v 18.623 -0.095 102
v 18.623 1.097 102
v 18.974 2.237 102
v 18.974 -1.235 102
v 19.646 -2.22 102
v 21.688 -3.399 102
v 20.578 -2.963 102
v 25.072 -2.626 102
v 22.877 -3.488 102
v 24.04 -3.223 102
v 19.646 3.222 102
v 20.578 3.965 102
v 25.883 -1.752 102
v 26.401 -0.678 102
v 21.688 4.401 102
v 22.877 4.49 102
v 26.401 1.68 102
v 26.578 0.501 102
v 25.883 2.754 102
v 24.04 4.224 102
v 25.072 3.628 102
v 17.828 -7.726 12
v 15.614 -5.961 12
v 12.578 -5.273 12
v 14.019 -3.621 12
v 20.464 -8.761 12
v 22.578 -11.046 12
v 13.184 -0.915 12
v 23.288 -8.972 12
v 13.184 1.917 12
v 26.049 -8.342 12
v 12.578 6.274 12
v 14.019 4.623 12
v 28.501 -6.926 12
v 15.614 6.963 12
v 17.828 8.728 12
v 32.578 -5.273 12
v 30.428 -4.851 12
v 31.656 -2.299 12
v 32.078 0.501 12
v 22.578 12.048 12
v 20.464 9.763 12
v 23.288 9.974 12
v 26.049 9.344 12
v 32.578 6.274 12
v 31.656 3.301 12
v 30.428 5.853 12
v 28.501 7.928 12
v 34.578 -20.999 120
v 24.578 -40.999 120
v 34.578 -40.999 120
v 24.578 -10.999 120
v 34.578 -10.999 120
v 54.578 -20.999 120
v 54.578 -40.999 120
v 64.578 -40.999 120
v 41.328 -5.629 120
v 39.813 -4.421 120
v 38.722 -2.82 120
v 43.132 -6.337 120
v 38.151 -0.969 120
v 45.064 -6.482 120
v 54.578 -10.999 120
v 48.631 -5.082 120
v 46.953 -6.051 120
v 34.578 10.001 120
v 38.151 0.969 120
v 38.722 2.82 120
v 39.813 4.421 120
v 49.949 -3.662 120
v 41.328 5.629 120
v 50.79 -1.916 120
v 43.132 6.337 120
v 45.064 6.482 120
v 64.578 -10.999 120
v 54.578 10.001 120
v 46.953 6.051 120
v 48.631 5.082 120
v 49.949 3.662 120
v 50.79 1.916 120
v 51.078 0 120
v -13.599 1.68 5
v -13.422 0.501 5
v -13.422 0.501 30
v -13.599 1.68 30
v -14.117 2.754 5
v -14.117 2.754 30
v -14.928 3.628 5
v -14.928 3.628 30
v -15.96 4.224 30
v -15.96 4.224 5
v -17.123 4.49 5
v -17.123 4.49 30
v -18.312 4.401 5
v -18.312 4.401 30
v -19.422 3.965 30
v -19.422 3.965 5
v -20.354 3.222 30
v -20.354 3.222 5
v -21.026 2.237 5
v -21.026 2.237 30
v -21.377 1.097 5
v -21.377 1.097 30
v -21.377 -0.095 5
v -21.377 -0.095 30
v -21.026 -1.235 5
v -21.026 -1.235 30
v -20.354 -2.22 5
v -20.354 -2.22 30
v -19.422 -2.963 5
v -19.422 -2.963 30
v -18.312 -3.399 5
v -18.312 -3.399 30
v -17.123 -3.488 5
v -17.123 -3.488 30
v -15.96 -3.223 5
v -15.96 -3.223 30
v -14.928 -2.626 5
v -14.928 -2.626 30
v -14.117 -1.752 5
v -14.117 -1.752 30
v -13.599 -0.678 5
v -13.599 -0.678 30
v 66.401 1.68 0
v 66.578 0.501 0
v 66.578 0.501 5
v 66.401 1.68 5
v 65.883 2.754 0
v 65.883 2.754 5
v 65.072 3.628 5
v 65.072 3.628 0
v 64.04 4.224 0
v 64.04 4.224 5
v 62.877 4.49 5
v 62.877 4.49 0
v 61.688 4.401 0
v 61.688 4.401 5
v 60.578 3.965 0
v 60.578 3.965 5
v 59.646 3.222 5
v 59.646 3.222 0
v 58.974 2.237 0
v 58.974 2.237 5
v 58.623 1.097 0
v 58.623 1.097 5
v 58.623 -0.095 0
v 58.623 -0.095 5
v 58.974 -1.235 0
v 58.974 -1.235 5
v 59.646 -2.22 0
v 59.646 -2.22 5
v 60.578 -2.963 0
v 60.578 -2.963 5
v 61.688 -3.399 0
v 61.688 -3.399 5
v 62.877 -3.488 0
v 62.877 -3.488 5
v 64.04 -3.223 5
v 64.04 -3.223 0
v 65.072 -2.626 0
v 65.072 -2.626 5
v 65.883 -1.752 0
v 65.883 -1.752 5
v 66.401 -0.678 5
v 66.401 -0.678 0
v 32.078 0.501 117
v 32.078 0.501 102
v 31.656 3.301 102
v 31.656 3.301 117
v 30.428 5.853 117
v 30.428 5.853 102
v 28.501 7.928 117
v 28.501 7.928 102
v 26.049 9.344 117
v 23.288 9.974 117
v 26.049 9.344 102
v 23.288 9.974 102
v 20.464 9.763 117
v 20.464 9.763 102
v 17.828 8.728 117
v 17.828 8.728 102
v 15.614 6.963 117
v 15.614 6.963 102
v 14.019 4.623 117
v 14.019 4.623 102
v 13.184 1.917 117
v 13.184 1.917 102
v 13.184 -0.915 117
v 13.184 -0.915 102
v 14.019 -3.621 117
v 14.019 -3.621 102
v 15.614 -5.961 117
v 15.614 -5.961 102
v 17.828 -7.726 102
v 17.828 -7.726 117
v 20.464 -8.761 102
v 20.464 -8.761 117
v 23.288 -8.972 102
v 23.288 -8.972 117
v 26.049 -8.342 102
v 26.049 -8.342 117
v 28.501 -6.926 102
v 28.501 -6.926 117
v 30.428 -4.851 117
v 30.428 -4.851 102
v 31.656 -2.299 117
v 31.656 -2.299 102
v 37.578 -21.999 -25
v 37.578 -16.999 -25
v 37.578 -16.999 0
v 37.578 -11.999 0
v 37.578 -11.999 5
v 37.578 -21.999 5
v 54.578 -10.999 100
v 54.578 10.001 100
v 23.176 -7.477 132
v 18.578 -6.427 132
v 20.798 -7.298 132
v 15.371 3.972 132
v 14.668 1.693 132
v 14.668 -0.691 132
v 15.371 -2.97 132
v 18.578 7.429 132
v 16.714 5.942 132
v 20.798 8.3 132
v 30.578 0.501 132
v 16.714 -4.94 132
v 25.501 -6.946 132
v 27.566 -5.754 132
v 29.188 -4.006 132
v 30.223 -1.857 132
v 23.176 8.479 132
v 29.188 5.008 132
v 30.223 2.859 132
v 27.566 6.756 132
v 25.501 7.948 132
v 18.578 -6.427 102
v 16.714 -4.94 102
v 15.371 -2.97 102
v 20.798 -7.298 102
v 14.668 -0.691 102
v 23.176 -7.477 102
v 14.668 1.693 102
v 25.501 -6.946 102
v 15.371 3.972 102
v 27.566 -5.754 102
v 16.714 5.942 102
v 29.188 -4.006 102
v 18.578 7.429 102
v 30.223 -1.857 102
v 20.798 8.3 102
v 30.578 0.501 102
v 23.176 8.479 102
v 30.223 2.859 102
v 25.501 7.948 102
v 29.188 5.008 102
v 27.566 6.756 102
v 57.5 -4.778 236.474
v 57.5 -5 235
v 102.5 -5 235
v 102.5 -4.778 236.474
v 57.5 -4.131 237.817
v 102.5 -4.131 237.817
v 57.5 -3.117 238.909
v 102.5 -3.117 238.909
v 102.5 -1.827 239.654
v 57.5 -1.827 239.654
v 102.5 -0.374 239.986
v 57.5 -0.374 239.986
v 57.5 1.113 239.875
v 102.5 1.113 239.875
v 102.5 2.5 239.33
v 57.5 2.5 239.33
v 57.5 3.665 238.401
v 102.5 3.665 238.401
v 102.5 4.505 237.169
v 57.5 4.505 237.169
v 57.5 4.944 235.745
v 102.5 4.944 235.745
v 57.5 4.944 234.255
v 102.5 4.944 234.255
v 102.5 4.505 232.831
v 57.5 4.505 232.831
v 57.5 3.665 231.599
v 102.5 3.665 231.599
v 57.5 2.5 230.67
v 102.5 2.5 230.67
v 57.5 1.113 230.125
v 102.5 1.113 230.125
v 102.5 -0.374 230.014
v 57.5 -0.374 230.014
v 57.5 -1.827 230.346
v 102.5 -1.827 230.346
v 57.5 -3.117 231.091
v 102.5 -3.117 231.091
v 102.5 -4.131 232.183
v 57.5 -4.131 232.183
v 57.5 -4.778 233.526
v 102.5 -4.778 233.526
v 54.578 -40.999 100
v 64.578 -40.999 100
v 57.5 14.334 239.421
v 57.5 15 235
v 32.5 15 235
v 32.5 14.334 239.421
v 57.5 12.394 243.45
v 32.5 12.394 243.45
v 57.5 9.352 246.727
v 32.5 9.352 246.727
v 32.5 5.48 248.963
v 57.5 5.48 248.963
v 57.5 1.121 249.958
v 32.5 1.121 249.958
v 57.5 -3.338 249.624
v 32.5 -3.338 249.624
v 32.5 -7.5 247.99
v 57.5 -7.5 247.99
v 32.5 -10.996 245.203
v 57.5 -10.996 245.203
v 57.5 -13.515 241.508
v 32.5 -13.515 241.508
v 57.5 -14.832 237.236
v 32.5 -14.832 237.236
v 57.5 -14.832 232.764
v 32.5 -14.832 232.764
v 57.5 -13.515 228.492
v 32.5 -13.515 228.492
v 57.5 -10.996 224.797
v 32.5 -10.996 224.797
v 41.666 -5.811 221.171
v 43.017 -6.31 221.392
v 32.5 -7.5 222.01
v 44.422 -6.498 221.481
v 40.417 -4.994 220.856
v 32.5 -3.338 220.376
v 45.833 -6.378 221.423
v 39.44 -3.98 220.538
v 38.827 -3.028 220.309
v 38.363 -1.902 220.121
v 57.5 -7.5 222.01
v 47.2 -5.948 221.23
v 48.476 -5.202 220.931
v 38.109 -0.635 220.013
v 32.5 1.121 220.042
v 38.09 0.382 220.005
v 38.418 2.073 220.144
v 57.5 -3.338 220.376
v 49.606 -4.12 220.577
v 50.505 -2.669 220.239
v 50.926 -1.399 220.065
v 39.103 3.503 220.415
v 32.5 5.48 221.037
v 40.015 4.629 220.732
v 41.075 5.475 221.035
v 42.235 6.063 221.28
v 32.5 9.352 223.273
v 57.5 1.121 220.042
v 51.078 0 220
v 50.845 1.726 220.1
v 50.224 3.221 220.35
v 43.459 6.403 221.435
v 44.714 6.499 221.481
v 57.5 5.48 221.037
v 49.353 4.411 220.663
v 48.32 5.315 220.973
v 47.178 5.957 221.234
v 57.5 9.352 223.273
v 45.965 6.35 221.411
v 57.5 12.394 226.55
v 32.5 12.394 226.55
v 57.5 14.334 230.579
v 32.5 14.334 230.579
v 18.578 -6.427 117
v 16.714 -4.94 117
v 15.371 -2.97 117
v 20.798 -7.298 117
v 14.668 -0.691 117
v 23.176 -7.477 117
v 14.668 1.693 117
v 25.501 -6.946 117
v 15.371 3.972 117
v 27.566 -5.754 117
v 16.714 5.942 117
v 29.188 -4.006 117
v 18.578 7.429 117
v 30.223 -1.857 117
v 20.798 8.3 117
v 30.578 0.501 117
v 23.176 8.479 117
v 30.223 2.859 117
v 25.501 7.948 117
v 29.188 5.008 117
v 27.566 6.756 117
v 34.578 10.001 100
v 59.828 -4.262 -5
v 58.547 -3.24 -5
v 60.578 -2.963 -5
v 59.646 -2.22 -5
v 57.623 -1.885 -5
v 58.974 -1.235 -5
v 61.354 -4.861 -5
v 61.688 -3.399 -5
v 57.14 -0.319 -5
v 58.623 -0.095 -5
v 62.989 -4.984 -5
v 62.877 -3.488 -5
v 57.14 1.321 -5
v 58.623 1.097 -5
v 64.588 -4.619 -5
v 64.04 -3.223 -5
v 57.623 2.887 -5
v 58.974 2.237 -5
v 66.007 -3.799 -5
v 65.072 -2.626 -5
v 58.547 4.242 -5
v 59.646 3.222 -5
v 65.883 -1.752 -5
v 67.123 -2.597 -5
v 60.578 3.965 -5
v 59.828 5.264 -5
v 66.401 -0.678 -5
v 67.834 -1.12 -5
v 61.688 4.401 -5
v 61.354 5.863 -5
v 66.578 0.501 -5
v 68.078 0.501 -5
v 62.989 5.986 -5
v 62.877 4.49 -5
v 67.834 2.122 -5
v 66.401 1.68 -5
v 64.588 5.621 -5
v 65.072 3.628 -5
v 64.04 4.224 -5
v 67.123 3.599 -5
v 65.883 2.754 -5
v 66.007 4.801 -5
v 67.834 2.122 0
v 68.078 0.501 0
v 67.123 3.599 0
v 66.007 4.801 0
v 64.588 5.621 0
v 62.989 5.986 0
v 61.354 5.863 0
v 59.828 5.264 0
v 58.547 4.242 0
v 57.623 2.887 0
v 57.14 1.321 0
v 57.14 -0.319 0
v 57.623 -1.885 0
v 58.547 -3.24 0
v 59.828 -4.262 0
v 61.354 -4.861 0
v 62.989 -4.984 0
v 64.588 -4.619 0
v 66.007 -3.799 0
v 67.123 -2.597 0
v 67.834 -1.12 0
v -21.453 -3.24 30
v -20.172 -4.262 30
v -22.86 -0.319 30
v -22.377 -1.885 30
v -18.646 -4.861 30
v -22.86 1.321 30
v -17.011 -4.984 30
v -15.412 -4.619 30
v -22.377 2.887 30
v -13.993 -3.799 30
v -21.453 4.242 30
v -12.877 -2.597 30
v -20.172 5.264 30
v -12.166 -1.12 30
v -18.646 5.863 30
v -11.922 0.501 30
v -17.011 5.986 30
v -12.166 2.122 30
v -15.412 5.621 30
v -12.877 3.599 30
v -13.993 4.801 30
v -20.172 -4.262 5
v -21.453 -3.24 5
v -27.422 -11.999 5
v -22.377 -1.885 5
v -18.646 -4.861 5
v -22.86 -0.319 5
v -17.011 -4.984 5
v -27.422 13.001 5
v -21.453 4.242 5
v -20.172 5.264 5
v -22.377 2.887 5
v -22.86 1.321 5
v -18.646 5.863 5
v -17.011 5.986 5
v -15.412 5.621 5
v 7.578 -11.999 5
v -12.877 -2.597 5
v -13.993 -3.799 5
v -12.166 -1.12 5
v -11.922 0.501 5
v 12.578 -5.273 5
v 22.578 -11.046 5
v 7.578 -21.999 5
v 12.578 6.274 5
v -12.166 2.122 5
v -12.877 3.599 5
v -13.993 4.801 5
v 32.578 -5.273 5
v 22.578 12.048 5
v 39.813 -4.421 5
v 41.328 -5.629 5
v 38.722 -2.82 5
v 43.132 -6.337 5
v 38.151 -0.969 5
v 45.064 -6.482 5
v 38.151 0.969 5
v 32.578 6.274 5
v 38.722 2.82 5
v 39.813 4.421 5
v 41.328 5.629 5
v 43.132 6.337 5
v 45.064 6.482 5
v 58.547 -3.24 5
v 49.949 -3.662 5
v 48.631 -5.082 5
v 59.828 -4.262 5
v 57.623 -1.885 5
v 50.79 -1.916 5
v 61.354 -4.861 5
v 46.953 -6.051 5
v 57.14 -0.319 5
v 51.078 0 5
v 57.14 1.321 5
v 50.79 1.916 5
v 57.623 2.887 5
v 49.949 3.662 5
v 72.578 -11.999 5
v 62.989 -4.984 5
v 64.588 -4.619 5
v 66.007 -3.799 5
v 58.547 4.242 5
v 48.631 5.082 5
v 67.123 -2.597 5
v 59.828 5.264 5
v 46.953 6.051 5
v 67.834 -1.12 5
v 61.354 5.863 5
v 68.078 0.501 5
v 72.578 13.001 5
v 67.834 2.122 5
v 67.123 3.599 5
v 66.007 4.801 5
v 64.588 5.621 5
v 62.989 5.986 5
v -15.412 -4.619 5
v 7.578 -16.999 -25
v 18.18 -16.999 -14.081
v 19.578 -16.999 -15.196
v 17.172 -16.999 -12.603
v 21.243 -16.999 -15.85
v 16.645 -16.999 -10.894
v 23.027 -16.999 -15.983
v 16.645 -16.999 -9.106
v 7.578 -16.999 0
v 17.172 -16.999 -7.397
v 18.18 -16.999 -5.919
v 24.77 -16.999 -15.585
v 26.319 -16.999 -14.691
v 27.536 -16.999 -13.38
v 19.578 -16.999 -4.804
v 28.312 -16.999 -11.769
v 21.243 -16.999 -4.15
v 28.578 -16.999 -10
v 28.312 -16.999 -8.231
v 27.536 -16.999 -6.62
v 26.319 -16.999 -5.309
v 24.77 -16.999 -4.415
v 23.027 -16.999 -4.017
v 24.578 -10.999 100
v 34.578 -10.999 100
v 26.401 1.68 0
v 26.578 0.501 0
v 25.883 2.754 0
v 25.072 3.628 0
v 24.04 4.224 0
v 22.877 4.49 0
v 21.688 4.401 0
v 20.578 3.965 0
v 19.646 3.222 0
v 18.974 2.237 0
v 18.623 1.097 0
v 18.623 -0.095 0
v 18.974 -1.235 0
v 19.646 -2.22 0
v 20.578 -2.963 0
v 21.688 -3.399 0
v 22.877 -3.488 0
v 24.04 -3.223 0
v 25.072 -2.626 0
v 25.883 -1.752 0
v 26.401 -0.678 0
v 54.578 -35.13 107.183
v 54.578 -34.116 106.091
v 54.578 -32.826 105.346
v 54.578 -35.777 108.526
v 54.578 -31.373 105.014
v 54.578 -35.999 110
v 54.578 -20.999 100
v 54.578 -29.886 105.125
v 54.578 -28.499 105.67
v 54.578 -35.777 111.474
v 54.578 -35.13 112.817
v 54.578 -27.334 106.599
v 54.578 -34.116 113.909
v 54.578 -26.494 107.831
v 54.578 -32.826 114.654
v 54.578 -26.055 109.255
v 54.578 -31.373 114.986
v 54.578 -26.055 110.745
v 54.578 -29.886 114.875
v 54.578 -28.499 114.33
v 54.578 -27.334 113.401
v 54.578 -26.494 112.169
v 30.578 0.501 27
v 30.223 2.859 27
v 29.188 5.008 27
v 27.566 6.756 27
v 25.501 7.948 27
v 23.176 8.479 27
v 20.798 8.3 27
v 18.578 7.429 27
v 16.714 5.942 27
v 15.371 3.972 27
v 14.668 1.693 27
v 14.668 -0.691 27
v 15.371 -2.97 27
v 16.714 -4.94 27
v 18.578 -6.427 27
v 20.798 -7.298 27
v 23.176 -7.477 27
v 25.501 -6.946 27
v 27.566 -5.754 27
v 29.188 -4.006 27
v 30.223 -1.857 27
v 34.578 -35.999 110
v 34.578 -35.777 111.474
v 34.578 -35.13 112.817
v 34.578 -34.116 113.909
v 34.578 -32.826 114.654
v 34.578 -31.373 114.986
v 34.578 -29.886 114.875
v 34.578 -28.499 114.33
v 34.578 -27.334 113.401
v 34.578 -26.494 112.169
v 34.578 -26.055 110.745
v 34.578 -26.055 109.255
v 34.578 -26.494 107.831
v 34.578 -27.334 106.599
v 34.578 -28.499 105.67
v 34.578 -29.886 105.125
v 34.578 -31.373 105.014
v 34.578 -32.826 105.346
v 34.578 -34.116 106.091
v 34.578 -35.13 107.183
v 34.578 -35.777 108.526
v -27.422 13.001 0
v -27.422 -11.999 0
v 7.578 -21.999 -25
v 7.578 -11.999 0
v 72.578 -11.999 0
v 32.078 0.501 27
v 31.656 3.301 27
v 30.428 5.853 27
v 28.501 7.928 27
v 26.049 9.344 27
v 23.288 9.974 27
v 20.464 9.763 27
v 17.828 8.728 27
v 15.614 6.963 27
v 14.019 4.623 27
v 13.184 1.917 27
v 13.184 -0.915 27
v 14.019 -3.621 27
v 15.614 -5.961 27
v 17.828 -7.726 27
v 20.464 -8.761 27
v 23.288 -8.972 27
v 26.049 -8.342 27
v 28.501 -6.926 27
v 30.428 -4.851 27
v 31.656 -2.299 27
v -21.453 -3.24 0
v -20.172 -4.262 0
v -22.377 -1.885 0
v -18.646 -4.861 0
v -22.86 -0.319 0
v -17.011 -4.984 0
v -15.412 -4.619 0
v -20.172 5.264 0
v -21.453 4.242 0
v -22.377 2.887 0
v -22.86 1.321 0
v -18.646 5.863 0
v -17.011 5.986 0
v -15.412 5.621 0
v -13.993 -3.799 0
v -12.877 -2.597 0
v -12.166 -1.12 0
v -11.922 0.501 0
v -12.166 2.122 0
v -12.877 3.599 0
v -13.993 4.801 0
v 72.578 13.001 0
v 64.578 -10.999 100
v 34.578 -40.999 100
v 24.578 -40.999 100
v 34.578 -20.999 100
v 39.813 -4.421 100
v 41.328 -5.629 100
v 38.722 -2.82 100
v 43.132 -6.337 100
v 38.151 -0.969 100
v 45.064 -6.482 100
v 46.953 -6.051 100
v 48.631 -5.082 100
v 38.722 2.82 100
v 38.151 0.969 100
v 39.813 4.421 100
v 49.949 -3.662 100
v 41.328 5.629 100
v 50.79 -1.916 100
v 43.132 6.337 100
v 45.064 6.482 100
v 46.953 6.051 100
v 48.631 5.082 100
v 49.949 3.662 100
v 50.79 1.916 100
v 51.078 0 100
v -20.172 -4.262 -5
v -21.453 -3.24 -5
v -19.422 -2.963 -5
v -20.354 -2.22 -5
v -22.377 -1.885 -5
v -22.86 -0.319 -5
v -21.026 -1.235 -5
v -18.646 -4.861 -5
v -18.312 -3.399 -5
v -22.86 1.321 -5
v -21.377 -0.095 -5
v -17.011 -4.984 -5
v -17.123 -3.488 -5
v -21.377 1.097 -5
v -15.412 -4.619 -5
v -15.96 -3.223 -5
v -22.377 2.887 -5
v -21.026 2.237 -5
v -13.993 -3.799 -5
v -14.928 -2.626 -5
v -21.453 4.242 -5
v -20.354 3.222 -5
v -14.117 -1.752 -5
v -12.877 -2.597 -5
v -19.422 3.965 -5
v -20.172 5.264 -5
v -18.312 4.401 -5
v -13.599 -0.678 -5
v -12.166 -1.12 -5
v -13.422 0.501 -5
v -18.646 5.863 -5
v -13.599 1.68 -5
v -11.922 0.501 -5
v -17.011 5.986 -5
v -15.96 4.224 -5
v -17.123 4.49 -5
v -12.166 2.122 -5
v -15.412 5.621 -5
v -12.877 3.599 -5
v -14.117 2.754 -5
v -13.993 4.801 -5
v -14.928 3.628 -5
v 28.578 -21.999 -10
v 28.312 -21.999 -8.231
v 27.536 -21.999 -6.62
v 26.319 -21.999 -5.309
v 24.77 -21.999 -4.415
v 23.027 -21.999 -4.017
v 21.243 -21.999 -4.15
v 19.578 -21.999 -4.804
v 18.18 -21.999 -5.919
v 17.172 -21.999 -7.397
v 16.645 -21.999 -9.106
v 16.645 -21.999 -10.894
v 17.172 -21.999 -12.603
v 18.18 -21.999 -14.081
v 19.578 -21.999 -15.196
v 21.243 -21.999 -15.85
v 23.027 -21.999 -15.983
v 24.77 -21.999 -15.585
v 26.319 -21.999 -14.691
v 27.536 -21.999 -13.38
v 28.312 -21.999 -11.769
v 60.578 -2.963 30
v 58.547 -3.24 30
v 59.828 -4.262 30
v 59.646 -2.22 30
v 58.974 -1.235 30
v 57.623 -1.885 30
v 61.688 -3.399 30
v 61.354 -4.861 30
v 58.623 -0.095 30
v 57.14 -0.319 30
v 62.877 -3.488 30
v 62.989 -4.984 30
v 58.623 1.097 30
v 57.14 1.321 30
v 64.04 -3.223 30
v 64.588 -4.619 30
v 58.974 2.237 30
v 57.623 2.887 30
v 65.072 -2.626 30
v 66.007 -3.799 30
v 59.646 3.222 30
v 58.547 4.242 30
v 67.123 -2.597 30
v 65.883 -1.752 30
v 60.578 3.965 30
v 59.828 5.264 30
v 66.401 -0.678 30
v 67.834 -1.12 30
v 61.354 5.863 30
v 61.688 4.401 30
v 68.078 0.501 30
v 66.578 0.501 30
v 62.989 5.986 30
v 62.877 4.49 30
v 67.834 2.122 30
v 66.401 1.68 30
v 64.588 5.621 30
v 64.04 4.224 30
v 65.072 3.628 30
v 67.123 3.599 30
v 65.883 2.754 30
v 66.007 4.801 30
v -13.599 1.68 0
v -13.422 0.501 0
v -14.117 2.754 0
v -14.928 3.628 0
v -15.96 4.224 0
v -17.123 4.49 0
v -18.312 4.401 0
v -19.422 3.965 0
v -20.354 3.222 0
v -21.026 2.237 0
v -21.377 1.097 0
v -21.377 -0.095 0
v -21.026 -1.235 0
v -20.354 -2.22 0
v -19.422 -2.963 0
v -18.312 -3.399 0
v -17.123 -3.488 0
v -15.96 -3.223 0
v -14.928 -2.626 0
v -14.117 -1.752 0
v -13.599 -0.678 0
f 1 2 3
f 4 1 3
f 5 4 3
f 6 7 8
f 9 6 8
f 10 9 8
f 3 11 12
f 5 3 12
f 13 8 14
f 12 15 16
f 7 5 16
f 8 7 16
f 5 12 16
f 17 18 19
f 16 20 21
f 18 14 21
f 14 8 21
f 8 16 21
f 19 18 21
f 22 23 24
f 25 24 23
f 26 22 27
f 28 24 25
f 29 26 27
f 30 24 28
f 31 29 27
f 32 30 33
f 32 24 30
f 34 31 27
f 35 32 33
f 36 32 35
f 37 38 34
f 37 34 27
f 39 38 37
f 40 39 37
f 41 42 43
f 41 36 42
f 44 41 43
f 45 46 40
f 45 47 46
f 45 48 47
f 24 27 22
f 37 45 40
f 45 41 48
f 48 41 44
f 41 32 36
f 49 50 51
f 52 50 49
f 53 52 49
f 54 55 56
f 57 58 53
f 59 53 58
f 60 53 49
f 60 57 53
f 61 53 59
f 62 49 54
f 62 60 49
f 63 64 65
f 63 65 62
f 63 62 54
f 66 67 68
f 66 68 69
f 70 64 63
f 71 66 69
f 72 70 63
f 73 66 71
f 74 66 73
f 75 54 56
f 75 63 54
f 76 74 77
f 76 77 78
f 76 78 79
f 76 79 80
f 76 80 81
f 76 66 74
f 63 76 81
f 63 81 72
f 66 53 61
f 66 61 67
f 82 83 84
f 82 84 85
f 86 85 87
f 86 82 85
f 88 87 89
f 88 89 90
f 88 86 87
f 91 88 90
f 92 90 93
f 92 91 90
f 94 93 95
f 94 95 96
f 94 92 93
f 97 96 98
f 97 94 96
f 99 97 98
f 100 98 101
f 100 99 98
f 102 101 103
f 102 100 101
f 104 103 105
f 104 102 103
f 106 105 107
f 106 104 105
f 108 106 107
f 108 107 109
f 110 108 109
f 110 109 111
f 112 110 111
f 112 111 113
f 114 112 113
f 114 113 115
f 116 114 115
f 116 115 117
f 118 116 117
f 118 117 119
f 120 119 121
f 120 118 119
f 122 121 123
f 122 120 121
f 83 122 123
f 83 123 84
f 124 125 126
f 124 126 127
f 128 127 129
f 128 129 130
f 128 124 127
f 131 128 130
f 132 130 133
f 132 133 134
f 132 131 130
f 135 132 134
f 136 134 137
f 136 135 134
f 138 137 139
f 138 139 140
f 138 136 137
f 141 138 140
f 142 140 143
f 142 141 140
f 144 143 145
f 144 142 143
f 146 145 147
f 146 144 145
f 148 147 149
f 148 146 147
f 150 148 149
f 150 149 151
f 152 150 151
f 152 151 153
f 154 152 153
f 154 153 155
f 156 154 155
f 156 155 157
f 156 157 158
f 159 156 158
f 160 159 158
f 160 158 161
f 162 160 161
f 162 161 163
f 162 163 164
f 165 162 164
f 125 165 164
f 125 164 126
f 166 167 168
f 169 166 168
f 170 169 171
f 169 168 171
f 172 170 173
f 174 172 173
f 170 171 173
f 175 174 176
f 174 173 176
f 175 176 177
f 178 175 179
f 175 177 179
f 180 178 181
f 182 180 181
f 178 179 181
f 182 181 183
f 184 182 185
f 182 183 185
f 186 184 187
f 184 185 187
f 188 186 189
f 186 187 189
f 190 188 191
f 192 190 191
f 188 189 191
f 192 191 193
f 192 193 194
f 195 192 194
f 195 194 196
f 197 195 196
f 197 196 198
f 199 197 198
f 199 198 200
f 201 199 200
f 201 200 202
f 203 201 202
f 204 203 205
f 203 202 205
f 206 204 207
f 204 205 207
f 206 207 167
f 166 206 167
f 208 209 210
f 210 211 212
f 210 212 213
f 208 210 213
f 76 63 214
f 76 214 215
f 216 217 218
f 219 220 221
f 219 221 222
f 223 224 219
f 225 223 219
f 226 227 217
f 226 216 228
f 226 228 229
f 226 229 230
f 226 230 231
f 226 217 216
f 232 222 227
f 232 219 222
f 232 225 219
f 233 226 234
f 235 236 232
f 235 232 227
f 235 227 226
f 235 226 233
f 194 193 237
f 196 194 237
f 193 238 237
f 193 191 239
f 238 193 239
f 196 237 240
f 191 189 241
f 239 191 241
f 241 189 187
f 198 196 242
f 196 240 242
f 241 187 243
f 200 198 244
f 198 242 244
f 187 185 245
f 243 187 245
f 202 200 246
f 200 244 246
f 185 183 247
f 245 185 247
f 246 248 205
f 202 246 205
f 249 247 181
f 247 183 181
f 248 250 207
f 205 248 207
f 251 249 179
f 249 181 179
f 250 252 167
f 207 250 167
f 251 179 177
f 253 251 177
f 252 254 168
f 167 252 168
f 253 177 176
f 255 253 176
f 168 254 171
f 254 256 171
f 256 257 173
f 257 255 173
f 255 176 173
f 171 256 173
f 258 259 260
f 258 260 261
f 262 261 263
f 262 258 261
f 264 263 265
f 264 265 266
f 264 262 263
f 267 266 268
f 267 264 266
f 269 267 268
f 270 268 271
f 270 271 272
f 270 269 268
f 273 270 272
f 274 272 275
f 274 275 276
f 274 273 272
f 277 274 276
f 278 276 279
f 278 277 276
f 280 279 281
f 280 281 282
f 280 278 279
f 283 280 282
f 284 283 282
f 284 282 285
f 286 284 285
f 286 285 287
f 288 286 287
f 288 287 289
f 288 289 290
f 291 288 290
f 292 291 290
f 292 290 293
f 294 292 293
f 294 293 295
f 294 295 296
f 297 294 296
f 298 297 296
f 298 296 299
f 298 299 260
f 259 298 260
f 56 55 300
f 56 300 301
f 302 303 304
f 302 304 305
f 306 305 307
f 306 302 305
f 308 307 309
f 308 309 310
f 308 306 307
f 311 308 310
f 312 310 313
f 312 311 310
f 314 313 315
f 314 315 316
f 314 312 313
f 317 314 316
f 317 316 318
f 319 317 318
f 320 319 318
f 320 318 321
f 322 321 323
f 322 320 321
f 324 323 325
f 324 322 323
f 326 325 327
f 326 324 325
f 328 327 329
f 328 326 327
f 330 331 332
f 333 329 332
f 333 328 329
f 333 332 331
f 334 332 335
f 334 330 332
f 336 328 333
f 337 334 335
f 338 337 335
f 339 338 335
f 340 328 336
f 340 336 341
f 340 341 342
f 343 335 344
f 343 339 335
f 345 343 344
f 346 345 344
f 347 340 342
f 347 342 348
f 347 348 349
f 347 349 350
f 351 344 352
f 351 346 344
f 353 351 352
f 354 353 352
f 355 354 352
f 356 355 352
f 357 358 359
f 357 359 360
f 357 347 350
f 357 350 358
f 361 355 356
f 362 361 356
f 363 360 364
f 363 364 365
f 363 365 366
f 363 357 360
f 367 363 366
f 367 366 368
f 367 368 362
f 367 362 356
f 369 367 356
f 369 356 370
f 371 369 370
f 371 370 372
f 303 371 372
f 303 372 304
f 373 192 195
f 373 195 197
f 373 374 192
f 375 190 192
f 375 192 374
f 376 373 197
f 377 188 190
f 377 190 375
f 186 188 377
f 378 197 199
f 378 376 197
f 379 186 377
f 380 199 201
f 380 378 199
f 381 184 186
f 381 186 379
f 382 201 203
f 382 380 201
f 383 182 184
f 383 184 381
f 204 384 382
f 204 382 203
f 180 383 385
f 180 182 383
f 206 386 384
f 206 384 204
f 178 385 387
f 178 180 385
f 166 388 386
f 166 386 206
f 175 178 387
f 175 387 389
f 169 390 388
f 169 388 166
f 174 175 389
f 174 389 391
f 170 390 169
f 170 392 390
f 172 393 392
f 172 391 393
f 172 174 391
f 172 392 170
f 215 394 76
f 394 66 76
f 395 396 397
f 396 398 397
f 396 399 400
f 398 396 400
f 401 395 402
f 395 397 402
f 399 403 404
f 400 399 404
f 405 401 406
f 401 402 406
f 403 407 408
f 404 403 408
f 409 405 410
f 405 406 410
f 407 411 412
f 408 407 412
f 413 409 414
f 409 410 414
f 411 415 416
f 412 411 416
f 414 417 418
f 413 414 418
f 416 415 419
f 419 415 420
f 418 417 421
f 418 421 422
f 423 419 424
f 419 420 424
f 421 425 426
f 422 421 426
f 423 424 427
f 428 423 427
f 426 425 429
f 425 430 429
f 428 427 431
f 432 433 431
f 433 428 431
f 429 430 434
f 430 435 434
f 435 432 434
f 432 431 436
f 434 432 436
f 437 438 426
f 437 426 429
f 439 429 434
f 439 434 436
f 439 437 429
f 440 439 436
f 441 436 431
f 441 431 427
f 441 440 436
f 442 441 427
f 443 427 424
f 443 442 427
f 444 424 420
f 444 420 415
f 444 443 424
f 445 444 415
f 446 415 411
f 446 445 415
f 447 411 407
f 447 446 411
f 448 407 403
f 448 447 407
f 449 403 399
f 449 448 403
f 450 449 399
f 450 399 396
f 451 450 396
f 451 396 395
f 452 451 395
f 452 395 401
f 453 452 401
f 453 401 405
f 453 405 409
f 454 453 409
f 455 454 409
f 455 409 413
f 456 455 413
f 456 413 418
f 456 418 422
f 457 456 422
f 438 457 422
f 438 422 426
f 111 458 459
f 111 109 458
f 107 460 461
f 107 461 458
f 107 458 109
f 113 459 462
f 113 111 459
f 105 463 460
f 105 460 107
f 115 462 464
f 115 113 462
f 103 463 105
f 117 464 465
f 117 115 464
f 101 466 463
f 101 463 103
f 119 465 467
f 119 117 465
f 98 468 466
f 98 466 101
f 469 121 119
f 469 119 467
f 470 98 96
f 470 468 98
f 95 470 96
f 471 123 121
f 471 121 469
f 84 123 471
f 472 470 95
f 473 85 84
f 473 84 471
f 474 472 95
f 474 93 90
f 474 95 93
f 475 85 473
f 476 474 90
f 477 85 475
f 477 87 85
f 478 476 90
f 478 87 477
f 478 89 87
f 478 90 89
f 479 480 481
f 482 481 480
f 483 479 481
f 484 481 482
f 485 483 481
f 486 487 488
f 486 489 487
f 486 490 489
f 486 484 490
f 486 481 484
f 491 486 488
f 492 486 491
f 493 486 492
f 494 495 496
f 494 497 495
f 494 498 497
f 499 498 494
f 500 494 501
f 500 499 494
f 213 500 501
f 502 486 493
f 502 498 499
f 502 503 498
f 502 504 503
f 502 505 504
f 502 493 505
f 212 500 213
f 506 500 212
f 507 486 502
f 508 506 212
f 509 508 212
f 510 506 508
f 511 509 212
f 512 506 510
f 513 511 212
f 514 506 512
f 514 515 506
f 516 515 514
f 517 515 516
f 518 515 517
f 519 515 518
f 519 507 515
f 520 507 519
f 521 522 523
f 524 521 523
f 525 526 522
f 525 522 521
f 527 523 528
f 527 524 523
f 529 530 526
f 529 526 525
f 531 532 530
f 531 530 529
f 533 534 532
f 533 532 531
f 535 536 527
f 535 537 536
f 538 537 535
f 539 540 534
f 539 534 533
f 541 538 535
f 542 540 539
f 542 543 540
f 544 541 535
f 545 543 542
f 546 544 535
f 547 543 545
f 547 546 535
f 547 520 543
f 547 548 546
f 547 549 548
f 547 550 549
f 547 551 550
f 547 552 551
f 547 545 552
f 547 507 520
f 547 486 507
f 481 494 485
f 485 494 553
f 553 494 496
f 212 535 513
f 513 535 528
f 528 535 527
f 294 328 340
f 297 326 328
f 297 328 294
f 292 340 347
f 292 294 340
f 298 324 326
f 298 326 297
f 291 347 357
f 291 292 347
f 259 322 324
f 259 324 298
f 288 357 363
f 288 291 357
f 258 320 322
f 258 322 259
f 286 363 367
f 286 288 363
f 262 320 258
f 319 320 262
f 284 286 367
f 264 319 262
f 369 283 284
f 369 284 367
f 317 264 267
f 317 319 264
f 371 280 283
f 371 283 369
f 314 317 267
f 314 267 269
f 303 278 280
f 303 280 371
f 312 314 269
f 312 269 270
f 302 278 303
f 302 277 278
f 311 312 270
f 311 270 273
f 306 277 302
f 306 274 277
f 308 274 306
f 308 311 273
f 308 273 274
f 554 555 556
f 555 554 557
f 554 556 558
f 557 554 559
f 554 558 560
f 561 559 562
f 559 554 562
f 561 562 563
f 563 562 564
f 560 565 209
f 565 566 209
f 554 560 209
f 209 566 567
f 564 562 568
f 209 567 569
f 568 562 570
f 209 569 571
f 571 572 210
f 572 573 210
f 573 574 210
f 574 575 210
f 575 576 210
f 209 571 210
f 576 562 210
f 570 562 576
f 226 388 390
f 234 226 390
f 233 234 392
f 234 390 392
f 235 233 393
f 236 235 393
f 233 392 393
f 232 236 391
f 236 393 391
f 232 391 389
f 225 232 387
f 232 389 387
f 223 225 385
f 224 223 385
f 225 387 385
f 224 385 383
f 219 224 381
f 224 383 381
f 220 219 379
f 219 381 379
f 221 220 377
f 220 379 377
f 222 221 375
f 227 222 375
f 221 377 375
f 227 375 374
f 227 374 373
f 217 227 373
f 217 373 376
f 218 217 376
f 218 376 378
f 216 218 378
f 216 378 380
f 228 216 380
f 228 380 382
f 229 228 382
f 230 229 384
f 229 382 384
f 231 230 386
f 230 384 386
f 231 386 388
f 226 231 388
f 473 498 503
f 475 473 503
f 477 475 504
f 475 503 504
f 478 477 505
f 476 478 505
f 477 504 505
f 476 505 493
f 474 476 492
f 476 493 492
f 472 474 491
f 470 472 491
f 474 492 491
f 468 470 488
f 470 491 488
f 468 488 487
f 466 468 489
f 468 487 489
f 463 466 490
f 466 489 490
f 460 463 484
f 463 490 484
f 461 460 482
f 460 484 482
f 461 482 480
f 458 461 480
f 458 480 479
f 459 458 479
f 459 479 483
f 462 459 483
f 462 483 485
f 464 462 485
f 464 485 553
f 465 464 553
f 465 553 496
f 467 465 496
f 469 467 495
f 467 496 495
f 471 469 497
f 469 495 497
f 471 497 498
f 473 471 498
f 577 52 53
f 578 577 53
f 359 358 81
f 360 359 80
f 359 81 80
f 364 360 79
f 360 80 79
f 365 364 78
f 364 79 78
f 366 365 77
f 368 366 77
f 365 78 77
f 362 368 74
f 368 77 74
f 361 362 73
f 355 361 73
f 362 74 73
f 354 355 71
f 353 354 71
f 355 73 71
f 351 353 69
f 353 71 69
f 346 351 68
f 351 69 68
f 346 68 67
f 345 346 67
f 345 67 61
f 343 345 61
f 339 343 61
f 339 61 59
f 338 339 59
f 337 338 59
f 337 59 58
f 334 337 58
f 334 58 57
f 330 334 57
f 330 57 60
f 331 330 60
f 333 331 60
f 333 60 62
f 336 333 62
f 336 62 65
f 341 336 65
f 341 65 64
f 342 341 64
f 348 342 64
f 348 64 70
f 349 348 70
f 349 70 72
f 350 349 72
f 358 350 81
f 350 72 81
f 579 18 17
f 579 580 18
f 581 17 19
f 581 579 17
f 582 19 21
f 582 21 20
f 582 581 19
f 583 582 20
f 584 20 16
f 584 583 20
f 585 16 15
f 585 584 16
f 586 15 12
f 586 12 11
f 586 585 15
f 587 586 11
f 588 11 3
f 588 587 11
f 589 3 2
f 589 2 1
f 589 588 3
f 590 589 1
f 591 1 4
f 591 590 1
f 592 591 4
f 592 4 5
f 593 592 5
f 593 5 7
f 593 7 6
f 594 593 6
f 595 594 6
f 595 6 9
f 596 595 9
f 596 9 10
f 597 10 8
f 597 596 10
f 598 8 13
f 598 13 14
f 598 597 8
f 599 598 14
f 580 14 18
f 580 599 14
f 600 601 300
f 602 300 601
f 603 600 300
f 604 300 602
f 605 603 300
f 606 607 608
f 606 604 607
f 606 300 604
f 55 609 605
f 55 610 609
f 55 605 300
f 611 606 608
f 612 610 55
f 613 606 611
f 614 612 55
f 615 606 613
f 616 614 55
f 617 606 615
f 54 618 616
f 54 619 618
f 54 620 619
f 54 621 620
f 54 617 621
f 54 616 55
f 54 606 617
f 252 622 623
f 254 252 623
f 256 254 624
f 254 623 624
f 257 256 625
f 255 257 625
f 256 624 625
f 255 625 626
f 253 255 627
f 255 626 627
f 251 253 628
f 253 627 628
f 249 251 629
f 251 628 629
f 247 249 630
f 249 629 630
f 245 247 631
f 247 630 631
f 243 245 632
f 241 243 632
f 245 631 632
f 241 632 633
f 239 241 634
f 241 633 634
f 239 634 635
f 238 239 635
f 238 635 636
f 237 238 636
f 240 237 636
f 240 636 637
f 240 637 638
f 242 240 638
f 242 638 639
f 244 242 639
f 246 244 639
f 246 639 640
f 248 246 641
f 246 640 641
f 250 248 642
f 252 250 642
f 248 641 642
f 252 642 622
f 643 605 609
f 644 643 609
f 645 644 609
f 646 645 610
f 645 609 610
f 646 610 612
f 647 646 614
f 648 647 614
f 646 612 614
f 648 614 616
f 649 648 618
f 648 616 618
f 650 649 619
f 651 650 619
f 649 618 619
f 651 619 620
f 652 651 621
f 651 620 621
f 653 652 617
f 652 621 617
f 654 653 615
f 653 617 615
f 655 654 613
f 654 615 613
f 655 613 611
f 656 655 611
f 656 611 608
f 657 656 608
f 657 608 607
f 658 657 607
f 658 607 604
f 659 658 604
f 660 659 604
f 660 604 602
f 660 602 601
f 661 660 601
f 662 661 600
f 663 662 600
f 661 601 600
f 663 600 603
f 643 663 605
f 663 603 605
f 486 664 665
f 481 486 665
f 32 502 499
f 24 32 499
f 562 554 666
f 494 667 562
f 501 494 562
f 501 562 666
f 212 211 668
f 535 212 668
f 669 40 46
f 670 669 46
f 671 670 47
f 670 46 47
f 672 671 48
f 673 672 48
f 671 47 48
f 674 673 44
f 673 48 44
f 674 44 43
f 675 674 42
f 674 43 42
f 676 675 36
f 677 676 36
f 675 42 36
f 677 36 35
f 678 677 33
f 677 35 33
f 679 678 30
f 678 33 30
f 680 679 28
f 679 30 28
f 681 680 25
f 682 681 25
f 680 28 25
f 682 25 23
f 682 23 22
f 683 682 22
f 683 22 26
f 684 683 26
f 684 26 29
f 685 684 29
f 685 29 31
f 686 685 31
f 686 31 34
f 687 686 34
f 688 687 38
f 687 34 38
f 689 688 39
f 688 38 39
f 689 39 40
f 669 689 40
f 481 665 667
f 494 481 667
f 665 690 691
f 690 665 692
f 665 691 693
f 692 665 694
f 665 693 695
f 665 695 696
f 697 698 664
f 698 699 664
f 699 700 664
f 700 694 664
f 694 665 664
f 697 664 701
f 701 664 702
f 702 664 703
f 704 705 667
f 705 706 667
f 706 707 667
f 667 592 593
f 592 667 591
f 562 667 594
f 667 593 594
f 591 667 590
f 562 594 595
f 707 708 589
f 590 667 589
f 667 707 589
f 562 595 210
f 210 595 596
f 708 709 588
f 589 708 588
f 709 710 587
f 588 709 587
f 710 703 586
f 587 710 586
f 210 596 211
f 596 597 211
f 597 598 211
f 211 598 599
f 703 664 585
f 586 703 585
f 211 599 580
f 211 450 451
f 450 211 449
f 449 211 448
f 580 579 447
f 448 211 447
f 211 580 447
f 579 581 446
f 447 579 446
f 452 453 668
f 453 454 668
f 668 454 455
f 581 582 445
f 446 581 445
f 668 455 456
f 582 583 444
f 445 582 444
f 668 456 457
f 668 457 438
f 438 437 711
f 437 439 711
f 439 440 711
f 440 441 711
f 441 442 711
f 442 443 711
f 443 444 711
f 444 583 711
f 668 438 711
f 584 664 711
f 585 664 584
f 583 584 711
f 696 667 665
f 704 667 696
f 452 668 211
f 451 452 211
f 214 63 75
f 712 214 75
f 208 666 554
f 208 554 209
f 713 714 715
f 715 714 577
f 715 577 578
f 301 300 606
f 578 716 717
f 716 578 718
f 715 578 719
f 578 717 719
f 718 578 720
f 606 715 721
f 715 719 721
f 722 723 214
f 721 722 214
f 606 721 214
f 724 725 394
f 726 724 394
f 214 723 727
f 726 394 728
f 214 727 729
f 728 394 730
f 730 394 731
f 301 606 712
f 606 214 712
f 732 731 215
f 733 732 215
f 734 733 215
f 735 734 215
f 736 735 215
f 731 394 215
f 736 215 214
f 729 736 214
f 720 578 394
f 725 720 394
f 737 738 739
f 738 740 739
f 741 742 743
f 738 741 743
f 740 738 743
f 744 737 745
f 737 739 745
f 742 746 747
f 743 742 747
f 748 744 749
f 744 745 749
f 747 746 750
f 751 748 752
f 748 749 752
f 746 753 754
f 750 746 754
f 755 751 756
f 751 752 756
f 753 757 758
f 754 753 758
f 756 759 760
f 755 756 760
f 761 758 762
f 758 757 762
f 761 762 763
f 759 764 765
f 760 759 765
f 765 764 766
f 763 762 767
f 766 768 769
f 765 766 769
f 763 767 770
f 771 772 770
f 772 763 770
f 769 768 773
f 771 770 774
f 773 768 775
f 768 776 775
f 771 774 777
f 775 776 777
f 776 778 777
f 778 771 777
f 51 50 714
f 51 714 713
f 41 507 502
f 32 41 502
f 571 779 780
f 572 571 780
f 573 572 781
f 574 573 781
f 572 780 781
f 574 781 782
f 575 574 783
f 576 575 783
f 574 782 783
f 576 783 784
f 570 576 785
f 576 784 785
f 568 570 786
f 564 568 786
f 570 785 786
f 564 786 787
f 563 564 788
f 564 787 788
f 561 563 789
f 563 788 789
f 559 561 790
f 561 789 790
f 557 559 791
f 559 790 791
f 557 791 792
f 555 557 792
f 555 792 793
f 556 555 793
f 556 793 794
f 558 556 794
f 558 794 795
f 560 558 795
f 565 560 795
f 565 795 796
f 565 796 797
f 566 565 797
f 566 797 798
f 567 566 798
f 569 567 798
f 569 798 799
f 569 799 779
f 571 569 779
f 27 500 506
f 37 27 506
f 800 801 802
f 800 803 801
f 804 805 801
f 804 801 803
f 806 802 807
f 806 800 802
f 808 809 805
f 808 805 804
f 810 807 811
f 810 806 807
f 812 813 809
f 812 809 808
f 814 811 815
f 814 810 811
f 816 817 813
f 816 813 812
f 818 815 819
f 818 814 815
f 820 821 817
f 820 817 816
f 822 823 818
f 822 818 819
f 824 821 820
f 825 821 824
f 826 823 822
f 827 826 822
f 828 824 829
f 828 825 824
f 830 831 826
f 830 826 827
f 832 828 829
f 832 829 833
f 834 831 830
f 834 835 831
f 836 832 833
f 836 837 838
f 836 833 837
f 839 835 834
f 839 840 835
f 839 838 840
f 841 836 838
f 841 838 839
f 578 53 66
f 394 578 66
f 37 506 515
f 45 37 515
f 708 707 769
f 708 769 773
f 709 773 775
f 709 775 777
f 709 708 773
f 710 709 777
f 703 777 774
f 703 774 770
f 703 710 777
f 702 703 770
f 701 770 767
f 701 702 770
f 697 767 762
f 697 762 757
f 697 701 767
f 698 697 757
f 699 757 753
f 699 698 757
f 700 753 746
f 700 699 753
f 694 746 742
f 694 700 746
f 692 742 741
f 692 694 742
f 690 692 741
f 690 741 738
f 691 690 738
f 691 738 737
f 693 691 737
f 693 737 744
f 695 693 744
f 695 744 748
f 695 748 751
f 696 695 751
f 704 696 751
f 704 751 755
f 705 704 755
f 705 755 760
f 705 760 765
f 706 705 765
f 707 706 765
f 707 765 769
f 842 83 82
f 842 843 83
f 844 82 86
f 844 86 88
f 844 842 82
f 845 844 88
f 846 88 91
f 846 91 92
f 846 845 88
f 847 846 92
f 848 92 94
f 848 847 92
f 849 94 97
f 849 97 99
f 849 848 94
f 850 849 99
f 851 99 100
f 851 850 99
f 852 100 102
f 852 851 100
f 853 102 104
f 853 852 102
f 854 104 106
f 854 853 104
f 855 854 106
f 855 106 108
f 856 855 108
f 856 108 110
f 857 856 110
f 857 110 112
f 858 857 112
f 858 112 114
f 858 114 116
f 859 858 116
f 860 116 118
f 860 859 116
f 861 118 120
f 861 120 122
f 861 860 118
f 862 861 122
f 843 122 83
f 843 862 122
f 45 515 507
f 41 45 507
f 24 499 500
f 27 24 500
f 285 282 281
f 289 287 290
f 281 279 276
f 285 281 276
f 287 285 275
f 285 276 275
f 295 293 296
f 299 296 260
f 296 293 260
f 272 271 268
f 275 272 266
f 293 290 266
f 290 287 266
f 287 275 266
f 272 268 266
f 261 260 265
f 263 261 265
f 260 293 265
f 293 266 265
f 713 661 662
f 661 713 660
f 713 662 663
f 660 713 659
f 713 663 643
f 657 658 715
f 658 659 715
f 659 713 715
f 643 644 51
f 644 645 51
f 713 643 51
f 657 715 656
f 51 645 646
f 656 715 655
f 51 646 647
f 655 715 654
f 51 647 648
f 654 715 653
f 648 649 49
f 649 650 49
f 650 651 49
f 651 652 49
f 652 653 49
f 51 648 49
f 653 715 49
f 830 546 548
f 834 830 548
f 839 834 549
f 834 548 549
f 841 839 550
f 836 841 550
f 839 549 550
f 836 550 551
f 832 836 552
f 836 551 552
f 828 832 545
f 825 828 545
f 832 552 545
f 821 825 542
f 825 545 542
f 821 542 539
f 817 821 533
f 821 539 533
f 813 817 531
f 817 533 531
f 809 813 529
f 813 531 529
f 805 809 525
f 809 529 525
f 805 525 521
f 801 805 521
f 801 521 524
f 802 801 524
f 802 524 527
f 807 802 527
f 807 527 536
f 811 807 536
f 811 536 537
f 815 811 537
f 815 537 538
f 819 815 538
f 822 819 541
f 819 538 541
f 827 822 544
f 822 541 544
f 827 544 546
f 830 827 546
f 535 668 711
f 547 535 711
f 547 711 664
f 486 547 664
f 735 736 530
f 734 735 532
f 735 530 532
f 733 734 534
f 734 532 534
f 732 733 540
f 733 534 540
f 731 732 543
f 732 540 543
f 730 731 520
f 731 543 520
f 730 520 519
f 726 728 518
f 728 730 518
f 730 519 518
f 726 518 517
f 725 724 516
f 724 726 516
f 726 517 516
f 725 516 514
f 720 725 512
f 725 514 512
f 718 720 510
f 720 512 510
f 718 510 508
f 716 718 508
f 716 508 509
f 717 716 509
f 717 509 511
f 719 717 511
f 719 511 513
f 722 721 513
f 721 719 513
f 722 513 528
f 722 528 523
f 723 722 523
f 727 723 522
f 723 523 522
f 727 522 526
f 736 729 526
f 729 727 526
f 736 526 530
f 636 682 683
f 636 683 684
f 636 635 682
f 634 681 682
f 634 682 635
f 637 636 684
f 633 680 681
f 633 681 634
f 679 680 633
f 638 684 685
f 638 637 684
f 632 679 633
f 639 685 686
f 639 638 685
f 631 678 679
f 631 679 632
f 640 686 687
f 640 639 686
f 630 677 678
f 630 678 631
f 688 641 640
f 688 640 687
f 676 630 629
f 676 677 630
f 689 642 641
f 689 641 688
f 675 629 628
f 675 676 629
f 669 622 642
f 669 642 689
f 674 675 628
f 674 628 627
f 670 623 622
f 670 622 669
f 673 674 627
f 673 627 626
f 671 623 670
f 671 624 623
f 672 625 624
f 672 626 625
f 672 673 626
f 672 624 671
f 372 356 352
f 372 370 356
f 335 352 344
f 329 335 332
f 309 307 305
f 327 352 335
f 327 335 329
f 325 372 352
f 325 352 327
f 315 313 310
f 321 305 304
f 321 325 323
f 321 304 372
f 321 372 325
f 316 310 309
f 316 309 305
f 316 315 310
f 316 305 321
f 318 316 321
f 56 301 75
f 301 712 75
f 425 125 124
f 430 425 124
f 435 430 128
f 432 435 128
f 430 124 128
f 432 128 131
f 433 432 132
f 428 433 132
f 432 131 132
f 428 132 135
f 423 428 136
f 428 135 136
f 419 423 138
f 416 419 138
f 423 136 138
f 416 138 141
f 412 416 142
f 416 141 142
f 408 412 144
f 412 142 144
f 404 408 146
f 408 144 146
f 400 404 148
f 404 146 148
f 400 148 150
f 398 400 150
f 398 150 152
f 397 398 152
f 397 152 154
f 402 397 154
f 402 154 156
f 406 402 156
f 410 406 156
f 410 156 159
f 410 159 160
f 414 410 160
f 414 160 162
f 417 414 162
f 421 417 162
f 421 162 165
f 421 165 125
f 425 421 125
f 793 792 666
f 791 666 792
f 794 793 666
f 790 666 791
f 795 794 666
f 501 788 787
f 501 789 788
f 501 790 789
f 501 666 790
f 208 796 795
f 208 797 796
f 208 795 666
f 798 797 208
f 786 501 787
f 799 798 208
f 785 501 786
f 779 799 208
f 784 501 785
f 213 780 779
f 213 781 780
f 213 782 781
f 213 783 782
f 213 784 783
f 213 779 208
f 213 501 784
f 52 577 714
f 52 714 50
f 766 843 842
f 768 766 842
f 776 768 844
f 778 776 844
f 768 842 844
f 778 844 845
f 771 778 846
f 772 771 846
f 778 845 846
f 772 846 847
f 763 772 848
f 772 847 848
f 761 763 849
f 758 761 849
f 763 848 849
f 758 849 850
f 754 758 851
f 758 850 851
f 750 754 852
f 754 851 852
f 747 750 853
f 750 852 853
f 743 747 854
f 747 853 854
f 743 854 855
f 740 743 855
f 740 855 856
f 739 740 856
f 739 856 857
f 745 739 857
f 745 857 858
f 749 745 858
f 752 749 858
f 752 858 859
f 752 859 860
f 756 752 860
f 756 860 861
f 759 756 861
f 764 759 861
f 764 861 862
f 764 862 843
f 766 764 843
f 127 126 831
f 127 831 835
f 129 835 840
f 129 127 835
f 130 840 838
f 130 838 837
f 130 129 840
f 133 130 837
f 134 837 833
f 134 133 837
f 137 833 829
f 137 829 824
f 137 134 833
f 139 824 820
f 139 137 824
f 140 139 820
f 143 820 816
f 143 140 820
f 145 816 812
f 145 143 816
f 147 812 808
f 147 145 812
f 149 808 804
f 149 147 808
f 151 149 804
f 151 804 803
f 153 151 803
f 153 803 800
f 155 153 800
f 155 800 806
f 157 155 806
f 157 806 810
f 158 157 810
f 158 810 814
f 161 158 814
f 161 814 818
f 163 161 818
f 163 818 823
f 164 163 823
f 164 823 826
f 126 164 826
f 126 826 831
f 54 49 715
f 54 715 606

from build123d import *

# Parameters (mm, degrees)
F0_R      = 4
F1_DEPTH  = 5
F2_R      = 5.5
F2_R_2    = 4
F3_DEPTH  = 25
F4_DEPTH  = 10
F5_W      = 30
F5_H      = 5
F6_DEPTH  = 25
F7_R      = 4
F8_DEPTH  = 7
F9_R      = 9.5
F9_R_2    = 4
F10_DEPTH = 15
F11_R     = 8
F11_R_2   = 4
F12_DEPTH = 75
F13_R     = 9.5
F14_DEPTH = 15
F15_R     = 8
F16_DEPTH = 15
F17_R     = 6.5
F18_DEPTH = 240
F20_W     = 20
F20_H     = 21
F21_DEPTH = 10
F23_R     = 15
F24_DEPTH = 12.5
F25_R     = 5
F26_DEPTH = 70
F27_R     = 6
F28_DEPTH = 25
F30_W     = 40
F30_H     = 20
F31_DEPTH = 10
F32_W     = 10
F32_H     = 20
F33_DEPTH = 20
F34_R     = 5
F35_DEPTH = 20


with BuildPart() as f1:
    # F0 (on Top) → F1 (new body)
    with BuildSketch(Plane.XY):
        Polygon((72.578296, 13.000988), (-27.421704, 13.000988), (-27.421704, -11.999012), (7.578296, -11.999012), (7.578296, -21.999012), (37.578296, -21.999012), (37.578296, -11.999012), (72.578296, -11.999012), align=None)
        with Locations((-17.421704, 0.500988)):
            Circle(F0_R, mode=Mode.SUBTRACT)
        with Locations((22.578296, 0.500988)):
            Circle(F0_R, mode=Mode.SUBTRACT)
        with Locations((62.578296, 0.500988)):
            Circle(F0_R, mode=Mode.SUBTRACT)
    extrude(amount=F1_DEPTH)

    # F2 (on face) → F3 (join)
    with BuildSketch(Plane.XY.offset(5)):
        with Locations((-17.421704, 0.500988)):
            Circle(F2_R)
        with Locations((-17.421704, 0.500988)):
            Circle(F2_R_2, mode=Mode.SUBTRACT)
        with Locations((62.578296, 0.500988)):
            Circle(F2_R)
        with Locations((62.578296, 0.500988)):
            Circle(F2_R_2, mode=Mode.SUBTRACT)
    extrude(amount=F3_DEPTH)

    # F2 (on face) → F4 (join)
    with BuildSketch(Plane.XY.offset(5)):
        with Locations((-17.421704, 0.500988)):
            Circle(F2_R)
        with Locations((-17.421704, 0.500988)):
            Circle(F2_R_2, mode=Mode.SUBTRACT)
        with Locations((62.578296, 0.500988)):
            Circle(F2_R)
        with Locations((62.578296, 0.500988)):
            Circle(F2_R_2, mode=Mode.SUBTRACT)
    extrude(amount=-F4_DEPTH)

    # F5 (on face) → F6 (join)
    with BuildSketch(Plane(origin=(0, 0, 0), x_dir=(1, 0, 0), z_dir=(0, 0, -1))):
        with Locations((22.578296, 19.499012)):
            Rectangle(F5_W, F5_H)
    extrude(amount=F6_DEPTH)

    # F7 (on face) → F8 (join)
    with BuildSketch(Plane.XY.offset(5)):
        Polygon((12.578296, 6.274491), (12.578296, -5.272514), (22.578296, -11.046017), (32.578296, -5.272514), (32.578296, 6.274491), (22.578296, 12.047994), align=None)
        with Locations((22.578296, 0.500988)):
            Circle(F7_R, mode=Mode.SUBTRACT)
    extrude(amount=F8_DEPTH)

    # F9 (on face) → F10 (join)
    with BuildSketch(Plane.XY.offset(12)):
        with Locations((22.578296, 0.500988)):
            Circle(F9_R)
        with Locations((22.578296, 0.500988)):
            Circle(F9_R_2, mode=Mode.SUBTRACT)
    extrude(amount=F10_DEPTH)

    # F11 (on face) → F12 (join)
    with BuildSketch(Plane.XY.offset(27)):
        with Locations((22.578296, 0.500988)):
            Circle(F11_R)
        with Locations((22.578296, 0.500988)):
            Circle(F11_R_2, mode=Mode.SUBTRACT)
    extrude(amount=F12_DEPTH)

    # F13 (on face) → F14 (join)
    with BuildSketch(Plane.XY.offset(102)):
        with Locations((22.578296, 0.500988)):
            Circle(F13_R)
    extrude(amount=F14_DEPTH)

    # F15 (on face) → F16 (join)
    with BuildSketch(Plane.XY.offset(117)):
        with Locations((22.578296, 0.500988)):
            Circle(F15_R)
    extrude(amount=F16_DEPTH)

    # F17 (on face) → F18 (join)
    with BuildSketch(Plane.XY.offset(5)):
        with Locations((44.578296, 0)):
            Circle(F17_R)
    extrude(amount=F18_DEPTH)

    # F20 (on offset) → F21 (join, symmetric)
    with BuildSketch(Plane.XY.offset(110)):
        with Locations((44.578296, -0.499012)):
            Rectangle(F20_W, F20_H)
    extrude(amount=F21_DEPTH, both=True)

    # F23 (on offset) → F24 (join, symmetric)
    with BuildSketch(Plane.YZ.offset(45)):
        with Locations((0, 235)):
            Circle(F23_R)
    extrude(amount=F24_DEPTH, both=True)

    # F25 (on face) → F26 (join)
    with BuildSketch(Plane(origin=(32.5, 0, 0), x_dir=(0, -1, 0), z_dir=(-1, 0, 0))):
        with Locations((0, 235)):
            Circle(F25_R)
    extrude(amount=-F26_DEPTH)

    # F27 (on face) → F28 (cut)
    with BuildSketch(Plane.XZ.offset(21.999012)):
        with Locations((22.578296, -10)):
            Circle(F27_R)
    extrude(amount=-F28_DEPTH, mode=Mode.SUBTRACT)

    # F30 (on face) → F31 (join)
    with BuildSketch(Plane.XZ.offset(10.999012)):
        with Locations((44.578296, 110)):
            Rectangle(F30_W, F30_H)
    extrude(amount=F31_DEPTH)

    # F32 (on face) → F33 (join)
    with BuildSketch(Plane.XZ.offset(20.999012)):
        with Locations((59.578296, 110)):
            Rectangle(F32_W, F32_H)
        with Locations((29.578296, 110)):
            Rectangle(F32_W, F32_H)
    extrude(amount=F33_DEPTH)

    # F34 (on face) → F35 (join, through all)
    with BuildSketch(Plane(origin=(54.578296, 0, 0), x_dir=(0, -1, 0), z_dir=(-1, 0, 0))):
        with Locations((30.999012, 110)):
            Circle(F34_R)
    extrude(amount=F35_DEPTH)


solid = f1.part
